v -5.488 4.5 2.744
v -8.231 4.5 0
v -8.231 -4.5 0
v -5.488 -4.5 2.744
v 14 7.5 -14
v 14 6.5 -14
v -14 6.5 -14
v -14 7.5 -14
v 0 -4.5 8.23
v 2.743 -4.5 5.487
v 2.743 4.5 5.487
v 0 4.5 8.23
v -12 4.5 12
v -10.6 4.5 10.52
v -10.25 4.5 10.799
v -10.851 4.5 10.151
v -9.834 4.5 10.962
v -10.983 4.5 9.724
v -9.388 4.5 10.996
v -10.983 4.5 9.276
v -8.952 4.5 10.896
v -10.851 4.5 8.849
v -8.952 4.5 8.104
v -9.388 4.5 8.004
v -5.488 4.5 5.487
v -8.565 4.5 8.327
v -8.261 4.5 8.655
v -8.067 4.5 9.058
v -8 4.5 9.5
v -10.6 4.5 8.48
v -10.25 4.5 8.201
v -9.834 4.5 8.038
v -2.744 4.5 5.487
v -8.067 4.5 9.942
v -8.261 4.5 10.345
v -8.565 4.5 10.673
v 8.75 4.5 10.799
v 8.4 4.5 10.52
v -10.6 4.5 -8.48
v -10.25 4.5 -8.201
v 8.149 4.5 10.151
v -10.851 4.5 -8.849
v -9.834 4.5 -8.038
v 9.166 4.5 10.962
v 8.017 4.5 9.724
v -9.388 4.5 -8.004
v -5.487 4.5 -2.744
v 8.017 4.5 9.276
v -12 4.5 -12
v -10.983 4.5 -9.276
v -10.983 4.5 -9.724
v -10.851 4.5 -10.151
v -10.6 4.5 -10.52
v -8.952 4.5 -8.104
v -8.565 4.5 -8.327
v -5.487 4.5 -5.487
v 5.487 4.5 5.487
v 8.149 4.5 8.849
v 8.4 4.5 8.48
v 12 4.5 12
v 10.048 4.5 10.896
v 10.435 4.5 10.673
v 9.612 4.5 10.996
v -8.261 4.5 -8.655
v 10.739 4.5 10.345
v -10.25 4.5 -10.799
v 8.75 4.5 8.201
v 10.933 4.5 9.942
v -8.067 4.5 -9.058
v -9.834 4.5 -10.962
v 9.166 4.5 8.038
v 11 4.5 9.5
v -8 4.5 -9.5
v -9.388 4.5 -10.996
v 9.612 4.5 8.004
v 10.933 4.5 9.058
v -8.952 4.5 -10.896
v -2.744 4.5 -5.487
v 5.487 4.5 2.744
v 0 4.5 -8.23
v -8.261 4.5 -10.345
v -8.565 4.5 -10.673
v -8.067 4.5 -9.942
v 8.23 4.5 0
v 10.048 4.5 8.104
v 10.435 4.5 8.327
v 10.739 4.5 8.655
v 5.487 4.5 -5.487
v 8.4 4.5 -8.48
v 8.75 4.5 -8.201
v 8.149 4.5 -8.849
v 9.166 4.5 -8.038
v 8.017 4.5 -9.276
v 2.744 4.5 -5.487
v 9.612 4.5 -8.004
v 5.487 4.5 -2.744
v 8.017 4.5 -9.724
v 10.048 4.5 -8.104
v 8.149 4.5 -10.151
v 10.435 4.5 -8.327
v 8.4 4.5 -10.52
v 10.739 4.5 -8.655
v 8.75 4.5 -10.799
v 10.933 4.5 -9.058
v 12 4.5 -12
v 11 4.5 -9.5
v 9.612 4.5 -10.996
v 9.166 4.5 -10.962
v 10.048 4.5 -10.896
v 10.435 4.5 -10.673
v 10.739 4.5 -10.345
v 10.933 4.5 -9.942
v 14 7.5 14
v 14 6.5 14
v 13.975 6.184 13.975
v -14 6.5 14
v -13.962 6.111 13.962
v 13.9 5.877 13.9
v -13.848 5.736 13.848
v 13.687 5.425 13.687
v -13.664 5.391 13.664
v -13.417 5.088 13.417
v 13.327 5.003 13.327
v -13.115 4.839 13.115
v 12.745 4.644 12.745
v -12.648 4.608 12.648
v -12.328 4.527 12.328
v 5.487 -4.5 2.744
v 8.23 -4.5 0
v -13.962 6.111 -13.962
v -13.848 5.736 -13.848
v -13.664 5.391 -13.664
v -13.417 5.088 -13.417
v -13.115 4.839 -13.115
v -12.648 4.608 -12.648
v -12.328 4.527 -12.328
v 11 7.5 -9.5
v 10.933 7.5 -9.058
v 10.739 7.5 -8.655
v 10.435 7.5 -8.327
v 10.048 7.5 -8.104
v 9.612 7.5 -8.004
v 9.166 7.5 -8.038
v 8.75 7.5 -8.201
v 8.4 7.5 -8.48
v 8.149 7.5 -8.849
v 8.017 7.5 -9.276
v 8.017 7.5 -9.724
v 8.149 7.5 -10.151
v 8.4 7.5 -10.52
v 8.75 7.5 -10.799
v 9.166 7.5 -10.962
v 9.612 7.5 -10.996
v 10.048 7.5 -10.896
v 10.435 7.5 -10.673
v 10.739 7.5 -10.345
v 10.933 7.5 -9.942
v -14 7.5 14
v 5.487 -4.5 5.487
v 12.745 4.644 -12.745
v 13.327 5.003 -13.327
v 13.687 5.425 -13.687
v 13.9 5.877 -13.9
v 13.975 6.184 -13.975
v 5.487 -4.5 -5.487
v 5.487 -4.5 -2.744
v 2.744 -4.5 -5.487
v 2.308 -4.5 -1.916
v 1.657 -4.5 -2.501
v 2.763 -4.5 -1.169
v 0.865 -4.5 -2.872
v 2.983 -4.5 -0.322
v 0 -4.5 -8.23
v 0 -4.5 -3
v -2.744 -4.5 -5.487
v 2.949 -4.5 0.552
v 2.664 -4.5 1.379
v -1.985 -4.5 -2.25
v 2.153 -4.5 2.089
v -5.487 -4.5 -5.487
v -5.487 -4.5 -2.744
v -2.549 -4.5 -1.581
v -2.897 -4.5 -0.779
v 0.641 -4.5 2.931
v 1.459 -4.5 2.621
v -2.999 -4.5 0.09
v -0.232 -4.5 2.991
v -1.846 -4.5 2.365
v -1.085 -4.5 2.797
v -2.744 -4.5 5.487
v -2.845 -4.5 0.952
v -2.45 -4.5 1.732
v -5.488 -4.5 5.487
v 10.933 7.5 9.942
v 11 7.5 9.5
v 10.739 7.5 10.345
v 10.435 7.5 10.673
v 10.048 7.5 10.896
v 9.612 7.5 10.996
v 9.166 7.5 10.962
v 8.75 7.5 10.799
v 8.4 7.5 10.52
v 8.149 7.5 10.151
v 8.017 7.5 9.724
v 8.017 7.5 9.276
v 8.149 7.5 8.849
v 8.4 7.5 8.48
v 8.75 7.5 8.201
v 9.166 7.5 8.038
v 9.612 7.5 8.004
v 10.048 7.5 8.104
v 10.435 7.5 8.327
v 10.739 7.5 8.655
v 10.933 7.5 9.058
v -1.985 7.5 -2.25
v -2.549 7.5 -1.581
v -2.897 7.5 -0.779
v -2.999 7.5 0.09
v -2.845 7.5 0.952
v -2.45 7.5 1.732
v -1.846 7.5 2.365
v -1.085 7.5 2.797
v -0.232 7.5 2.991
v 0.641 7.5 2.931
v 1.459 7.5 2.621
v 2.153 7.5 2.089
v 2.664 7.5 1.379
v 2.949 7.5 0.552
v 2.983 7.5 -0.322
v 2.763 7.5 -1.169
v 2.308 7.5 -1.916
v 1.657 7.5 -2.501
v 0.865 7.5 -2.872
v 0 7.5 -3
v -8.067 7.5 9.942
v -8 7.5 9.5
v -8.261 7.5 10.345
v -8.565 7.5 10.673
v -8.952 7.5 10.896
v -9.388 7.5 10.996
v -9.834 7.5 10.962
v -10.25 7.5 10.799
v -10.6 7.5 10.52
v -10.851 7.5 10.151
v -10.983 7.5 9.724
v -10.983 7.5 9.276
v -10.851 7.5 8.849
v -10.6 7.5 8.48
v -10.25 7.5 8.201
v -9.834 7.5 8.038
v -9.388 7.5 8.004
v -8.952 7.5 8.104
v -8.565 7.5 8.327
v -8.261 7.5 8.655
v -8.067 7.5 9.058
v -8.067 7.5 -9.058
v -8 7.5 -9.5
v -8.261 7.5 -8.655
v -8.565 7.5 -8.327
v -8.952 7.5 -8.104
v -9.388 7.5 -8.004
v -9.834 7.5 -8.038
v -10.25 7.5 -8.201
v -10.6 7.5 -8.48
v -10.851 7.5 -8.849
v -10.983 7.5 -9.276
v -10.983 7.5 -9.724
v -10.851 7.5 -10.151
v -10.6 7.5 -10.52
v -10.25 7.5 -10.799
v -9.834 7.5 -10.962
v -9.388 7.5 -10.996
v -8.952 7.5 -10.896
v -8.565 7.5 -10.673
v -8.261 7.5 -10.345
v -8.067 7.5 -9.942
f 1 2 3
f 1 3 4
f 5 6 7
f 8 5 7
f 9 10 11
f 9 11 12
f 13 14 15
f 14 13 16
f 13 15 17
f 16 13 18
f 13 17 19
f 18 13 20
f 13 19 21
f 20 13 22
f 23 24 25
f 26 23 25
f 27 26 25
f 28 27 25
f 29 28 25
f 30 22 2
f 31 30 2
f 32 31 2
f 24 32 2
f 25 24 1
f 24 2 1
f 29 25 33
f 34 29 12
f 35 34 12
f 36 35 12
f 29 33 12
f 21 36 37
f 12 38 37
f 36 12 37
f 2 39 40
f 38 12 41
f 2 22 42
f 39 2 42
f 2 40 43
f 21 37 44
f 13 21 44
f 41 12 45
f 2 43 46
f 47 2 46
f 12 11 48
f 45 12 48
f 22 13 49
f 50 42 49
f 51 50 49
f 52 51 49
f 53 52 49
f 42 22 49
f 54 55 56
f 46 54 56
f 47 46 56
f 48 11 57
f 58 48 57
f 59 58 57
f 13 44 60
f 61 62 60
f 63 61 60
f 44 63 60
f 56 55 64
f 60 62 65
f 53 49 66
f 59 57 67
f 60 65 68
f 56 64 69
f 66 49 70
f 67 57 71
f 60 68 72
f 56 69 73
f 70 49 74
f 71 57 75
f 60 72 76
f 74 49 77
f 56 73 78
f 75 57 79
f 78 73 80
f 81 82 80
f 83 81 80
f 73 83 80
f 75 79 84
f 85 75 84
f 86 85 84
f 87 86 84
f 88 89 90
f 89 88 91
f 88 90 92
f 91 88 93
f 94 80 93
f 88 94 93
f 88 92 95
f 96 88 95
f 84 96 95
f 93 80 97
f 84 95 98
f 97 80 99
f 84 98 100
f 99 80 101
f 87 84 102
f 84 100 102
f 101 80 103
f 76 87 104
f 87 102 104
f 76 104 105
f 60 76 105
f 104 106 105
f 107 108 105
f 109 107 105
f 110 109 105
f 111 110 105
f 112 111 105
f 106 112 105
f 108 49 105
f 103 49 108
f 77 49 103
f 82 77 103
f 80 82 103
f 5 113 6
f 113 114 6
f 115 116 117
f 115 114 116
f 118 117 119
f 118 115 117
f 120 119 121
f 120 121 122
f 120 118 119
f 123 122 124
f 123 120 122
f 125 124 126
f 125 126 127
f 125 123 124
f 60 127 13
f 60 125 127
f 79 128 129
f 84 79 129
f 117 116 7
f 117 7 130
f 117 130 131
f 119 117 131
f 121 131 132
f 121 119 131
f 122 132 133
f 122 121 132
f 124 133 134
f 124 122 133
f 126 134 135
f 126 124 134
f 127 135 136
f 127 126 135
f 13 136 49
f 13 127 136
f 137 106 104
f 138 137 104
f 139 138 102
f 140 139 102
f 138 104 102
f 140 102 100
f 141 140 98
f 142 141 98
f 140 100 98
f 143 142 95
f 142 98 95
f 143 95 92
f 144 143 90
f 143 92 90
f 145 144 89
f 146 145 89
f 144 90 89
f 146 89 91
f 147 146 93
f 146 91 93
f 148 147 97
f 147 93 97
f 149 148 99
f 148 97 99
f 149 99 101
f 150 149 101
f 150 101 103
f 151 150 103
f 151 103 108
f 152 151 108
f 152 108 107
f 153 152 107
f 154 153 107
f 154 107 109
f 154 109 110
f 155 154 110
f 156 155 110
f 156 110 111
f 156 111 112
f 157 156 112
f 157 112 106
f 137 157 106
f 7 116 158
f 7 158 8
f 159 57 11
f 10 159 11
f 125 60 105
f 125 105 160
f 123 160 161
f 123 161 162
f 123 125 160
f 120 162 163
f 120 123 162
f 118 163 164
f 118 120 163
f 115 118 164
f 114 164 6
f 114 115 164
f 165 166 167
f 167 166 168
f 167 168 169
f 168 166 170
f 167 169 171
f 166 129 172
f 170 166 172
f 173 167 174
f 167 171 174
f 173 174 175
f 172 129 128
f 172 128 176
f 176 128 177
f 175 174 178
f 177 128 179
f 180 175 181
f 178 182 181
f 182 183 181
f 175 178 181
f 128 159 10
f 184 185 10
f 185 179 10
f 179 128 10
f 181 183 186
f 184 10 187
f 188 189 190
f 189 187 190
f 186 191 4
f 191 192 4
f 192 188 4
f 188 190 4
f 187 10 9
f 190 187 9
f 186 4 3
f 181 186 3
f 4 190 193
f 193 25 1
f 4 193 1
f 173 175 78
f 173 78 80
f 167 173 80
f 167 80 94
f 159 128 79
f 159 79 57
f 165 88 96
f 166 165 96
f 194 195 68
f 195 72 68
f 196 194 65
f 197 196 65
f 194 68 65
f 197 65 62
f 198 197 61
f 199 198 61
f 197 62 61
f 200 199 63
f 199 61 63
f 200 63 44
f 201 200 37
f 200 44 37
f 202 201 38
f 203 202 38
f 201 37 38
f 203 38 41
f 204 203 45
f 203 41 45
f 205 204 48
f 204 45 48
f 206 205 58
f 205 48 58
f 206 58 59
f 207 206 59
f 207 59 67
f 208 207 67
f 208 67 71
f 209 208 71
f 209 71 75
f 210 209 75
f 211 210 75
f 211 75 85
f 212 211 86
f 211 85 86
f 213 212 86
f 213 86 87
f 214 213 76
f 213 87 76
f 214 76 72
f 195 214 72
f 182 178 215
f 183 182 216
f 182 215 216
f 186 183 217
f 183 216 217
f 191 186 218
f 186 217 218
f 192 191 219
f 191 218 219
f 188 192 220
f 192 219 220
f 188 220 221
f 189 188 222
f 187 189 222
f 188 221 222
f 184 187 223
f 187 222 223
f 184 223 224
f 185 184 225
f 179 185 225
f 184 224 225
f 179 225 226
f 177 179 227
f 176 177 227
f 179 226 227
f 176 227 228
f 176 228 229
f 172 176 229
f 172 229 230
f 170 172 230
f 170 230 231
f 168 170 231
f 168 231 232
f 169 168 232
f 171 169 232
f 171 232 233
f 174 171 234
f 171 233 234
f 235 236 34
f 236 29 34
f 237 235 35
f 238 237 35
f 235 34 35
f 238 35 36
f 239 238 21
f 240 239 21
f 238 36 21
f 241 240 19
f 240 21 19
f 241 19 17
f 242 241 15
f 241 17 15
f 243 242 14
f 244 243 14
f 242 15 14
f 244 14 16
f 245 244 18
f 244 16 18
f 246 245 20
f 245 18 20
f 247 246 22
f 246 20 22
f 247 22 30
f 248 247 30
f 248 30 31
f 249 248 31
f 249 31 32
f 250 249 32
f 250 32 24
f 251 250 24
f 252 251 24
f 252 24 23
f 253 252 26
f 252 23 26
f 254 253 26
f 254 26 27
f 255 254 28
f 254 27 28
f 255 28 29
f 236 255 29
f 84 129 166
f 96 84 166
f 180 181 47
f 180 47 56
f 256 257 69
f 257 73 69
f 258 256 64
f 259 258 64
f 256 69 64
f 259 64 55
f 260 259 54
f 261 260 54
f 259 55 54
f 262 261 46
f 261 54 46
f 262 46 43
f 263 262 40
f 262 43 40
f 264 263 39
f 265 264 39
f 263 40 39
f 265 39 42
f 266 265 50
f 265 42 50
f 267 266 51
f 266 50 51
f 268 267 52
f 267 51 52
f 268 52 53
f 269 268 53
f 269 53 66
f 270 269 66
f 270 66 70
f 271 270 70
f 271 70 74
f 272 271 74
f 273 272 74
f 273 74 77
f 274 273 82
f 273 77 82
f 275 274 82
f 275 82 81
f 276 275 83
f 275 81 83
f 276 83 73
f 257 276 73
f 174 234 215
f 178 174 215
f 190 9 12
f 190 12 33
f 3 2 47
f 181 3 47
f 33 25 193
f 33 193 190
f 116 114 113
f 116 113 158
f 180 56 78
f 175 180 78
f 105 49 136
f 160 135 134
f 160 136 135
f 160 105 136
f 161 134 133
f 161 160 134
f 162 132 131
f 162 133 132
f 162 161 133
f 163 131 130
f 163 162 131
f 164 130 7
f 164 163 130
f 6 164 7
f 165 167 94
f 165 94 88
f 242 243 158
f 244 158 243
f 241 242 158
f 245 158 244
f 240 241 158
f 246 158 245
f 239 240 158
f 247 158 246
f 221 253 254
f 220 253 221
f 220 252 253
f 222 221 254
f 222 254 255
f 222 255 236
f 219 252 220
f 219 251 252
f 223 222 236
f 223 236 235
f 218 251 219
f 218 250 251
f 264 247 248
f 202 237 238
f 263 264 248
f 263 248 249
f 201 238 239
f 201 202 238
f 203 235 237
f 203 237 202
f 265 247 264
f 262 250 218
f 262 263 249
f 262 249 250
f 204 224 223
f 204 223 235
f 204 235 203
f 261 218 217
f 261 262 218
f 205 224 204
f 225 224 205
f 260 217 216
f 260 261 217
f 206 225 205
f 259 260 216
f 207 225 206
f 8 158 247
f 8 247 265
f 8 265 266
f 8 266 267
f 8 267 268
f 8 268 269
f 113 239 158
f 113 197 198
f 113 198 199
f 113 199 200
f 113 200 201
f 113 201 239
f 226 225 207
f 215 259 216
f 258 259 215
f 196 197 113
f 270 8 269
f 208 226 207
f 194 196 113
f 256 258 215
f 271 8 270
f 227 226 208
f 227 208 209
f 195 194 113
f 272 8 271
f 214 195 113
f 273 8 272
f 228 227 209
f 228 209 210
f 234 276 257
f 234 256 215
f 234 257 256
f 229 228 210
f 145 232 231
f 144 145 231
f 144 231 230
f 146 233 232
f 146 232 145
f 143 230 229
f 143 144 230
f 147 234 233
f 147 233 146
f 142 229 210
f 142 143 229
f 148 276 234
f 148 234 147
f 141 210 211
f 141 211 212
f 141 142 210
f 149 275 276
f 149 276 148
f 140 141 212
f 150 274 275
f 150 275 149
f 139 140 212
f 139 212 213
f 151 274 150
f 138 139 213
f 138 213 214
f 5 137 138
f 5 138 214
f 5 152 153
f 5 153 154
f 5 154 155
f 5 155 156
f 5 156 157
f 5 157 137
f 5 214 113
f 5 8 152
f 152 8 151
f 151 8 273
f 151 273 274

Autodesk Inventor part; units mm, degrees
ref_plane "YZ Plane" through (0, 0, 0) normal (1, 0, 0) x (0, 1, 0)
ref_plane "XZ Plane" through (0, 0, 0) normal (0, 1, 0) x (-1, 0, 0)
ref_plane "XY Plane" through (0, 0, 0) normal (0, 0, 1) x (1, 0, 0)
sketch "Boceto1" plane through (0, 0, 0) normal (0, 1, 0) x (-1, 0, 0)
  line L0 (5.4875, 5.487) -> (5.4875, 2.7435)
  line L1 (-5.487, 5.487) -> (-2.743, 5.487)
  line L2 (5.4875, 5.487) -> (2.744, 5.487)
  line L3 (-5.487, -5.487) -> (-5.487, -2.7435)
  line L4 (8.2308, 0.0003) -> (5.4875, 2.7435)
  line L5 (8.2308, 0.0003) -> (5.487, -2.7435)
  line L6 (0, -8.2305) -> (-2.7435, -5.487)
  line L7 (-8.2305, 0) -> (-5.487, -2.7435)
  line L8 (-5.487, 2.7435) -> (-8.2305, 0)
  line L9 (-2.743, 5.487) -> (0.0005, 8.2305)
  line L10 (0.0005, 8.2305) -> (2.744, 5.487)
  line L11 (2.7435, -5.487) -> (0, -8.2305)
  line L12 (5.487, -5.487) -> (2.7435, -5.487)
  line L13 (-2.7435, -5.487) -> (-5.487, -5.487)
  line L14 (5.4875, 5.487) -> (5.4875, 2.7435)
  line L15 (5.487, -2.7435) -> (5.487, -5.487)
  line L16 (-5.487, 5.487) -> (-2.743, 5.487)
  line L17 (2.744, 5.487) -> (5.4875, 5.487)
  line L18 (-5.487, -5.487) -> (-5.487, -2.7435)
  line L19 (-5.487, 2.7435) -> (-5.487, 5.487)
  arc A0 (1.8459, -2.0921) -> (0, -2.79) centre (0, 0) ccw
  line L20 (0, -2.79) -> (1.8459, -2.0921)
  dimension "d11" = 2.744
extrude "Extrusión1" add sketch "Boceto1" along normal mid plane 9 contours L0 L4 L5 L15 L12 L11 L6 L13 L3 L7 L8 L19 L1 L9 L10 L2 | L20 A0
sketch "Boceto2" plane through (0, 4.5, 0) normal (0, 1, 0) x (1, 0, 0)
  line L0 (0, -14) -> (-14, -14)
  line L1 (-14, -14) -> (-14, 0)
  line L2 (0, 14) -> (-14, 14)
  line L3 (-14, 14) -> (-14, 0)
  line L4 (0, -14) -> (14, -14)
  line L5 (14, -14) -> (14, 0)
  line L6 (0, 14) -> (14, 14)
  line L7 (14, 14) -> (14, 0)
  line L8 (-14, -14) -> (-14, -9.5)
  circle A0 centre (-9.5, -9.5) radius 1.5
  circle A1 centre (9.5, -9.5) radius 1.5
  circle A2 centre (9.5, 9.5) radius 1.5
  circle A3 centre (-9.5, 9.5) radius 1.5
  point P0 (0, 0)
  dimension "d26" = 4.5
  dimension "d28" = 3
  dimension "d31" = 360
extrude "Extrusión2" add sketch "Boceto2" along normal blind 3 contours L0 L1 L3 L2 L6 L7 L5 L4 | A0 | A1 | A2 | A3
sketch "Boceto5" plane through (0, -4.5, 0) normal (0, -1, 0) x (1, 0, 0)
  arc A0 (0, -3) -> (-1.9849, -2.2495) centre (0, 0) ccw
  line L0 (0, -3) -> (-1.9849, -2.2495)
  dimension "d48" = 6
extrude "Extrusión5" cut sketch "Boceto5" along normal mid plane 100
fillet "Empalme1" radius 2 4 edges at (-14, 4.5, 0) (0, 4.5, -14) (14, 4.5, 0) (0, 4.5, 14)
sketch "Boceto7" plane through (0, 4.5, 0) normal (0, -1, 0) x (1, 0, 0)
  circle A0 centre (-9.5, 9.5) radius 1.5
  circle A1 centre (-9.5, -9.5) radius 1.5
  circle A2 centre (9.5, -9.5) radius 1.5
  circle A3 centre (9.5, 9.5) radius 1.5
  point P0 (0, 0)
  dimension "d75" = 3
  dimension "d78" = 360
extrude "Extrusión7" cut sketch "Boceto7" against normal mid plane 190
properties part number "Acople Motor 1"
